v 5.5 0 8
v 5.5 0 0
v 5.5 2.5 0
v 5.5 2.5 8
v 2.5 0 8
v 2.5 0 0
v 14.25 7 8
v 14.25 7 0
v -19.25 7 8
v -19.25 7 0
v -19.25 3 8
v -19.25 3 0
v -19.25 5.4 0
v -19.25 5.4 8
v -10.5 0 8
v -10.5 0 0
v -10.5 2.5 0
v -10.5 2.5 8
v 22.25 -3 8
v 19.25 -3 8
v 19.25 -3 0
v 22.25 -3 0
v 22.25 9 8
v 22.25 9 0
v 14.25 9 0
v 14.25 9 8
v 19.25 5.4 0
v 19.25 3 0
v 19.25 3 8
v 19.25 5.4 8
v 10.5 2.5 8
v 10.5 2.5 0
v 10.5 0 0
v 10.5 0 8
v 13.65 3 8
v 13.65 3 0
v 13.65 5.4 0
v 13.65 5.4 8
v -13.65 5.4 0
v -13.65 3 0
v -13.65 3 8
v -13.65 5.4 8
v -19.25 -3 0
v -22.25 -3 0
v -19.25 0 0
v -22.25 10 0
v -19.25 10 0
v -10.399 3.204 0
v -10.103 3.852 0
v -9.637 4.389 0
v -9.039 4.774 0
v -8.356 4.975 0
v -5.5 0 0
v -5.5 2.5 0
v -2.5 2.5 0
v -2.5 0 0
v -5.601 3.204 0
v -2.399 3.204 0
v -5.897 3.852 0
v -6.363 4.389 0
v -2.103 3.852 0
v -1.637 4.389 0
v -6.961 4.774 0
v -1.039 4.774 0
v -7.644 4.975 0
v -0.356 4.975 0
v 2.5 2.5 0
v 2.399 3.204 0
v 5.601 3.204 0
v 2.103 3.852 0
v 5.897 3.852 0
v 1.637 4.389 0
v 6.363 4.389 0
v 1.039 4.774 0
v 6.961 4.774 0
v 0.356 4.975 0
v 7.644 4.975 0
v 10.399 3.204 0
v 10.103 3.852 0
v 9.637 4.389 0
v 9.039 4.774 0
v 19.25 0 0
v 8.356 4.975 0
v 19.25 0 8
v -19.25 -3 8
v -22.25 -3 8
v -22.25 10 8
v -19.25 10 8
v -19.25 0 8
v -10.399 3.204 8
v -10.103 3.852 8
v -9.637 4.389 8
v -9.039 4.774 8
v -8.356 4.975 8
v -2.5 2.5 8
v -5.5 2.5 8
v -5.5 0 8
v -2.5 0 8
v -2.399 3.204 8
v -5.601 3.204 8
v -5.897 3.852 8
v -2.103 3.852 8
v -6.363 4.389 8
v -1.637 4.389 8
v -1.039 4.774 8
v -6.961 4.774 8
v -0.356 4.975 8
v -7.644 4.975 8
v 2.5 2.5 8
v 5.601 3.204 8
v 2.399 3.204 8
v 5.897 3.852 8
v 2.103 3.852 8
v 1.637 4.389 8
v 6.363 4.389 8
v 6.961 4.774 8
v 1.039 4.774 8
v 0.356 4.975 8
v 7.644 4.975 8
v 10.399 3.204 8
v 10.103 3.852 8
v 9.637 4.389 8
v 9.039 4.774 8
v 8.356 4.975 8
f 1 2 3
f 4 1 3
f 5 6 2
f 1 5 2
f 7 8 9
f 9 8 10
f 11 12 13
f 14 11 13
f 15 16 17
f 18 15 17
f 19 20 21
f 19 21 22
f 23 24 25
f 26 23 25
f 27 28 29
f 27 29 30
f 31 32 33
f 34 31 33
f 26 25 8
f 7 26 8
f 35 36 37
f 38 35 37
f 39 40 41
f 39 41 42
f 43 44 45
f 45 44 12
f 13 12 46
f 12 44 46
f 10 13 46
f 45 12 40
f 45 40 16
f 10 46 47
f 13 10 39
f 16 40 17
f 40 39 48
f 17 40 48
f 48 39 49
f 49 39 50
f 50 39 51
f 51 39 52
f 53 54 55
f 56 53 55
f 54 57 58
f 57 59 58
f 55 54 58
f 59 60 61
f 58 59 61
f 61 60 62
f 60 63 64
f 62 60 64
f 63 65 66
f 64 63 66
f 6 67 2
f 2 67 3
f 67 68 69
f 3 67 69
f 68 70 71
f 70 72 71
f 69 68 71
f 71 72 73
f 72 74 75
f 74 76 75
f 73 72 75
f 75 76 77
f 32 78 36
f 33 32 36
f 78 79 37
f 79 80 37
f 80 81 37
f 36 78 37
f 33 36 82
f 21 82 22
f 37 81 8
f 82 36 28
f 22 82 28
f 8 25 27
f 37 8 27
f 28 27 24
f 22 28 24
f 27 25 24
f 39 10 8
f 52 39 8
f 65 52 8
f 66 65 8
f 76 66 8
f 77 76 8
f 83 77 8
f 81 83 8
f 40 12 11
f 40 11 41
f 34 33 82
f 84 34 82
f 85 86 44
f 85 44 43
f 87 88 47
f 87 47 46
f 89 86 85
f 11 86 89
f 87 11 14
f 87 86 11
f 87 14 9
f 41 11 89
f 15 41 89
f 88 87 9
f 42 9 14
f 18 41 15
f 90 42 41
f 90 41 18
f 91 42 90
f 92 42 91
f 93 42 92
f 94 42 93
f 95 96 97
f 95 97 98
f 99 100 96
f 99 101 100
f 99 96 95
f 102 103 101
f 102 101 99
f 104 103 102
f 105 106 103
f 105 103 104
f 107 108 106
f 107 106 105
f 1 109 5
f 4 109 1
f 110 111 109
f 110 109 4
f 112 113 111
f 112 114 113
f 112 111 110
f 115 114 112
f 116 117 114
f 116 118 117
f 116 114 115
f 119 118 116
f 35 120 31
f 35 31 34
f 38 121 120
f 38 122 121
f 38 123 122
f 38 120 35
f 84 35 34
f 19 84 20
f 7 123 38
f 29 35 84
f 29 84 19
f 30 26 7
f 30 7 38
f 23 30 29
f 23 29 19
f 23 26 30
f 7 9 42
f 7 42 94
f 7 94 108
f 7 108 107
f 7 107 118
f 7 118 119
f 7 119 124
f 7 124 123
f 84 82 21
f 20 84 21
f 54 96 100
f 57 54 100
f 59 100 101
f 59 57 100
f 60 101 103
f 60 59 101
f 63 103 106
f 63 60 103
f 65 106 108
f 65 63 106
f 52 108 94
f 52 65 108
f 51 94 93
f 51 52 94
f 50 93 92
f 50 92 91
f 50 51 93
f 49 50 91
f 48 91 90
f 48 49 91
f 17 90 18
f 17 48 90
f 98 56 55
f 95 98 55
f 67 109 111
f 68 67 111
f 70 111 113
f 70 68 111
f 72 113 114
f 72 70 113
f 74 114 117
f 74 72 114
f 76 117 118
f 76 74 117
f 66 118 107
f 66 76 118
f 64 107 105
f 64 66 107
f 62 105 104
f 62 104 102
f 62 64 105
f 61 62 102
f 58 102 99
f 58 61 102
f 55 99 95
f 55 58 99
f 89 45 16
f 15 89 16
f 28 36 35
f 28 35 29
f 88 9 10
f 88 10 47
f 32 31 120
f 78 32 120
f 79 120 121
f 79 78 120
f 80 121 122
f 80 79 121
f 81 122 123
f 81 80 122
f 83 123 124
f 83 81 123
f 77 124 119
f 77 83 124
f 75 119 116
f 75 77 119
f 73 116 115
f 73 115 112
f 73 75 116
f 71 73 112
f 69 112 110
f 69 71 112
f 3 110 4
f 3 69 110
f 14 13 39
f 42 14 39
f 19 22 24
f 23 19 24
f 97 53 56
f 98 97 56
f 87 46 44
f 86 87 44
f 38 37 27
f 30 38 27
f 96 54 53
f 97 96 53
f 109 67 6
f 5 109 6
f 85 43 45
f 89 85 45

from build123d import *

# Parameters (mm, degrees)
SKETCH_W  = 5.6
SKETCH_H  = 2.4
PAD_DEPTH = 8


with BuildPart() as part:
    # Sketch → Pad (new body)
    with BuildSketch(Plane.XY):
        with BuildLine():
            Line((-22.25, -3), (-19.25, -3))
            Line((-19.25, -3), (-19.25, 0))
            Line((-19.25, 0), (-10.5, 0))
            Line((-10.5, 0), (-10.5, 2.5))
            ThreePointArc((-5.5, 2.5), (-8, 5), (-10.5, 2.5))
            Line((-5.5, 2.5), (-5.5, 0))
            Line((-5.5, 0), (-2.5, 0))
            Line((-2.5, 0), (-2.5, 2.5))
            ThreePointArc((2.5, 2.5), (0, 5), (-2.5, 2.5))
            Line((2.5, 2.5), (2.5, 0))
            Line((2.5, 0), (5.5, 0))
            Line((5.5, 0), (5.5, 2.5))
            ThreePointArc((10.5, 2.5), (8, 5), (5.5, 2.5))
            Line((10.5, 2.5), (10.5, 0))
            Line((10.5, 0), (19.25, 0))
            Line((19.25, 0), (19.25, -3))
            Line((19.25, -3), (22.25, -3))
            Line((22.25, -3), (22.25, 9))
            Line((22.25, 9), (14.25, 9))
            Line((14.25, 9), (14.25, 7))
            Line((14.25, 7), (-19.25, 7))
            Line((-19.25, 7), (-19.25, 10))
            Line((-19.25, 10), (-22.25, 10))
            Line((-22.25, 10), (-22.25, -3))
        make_face()
        with Locations((-16.45, 4.2)):
            Rectangle(SKETCH_W, SKETCH_H, mode=Mode.SUBTRACT)
        with Locations((16.45, 4.2)):
            Rectangle(SKETCH_W, SKETCH_H, mode=Mode.SUBTRACT)
    extrude(amount=PAD_DEPTH)


solid = part.part
